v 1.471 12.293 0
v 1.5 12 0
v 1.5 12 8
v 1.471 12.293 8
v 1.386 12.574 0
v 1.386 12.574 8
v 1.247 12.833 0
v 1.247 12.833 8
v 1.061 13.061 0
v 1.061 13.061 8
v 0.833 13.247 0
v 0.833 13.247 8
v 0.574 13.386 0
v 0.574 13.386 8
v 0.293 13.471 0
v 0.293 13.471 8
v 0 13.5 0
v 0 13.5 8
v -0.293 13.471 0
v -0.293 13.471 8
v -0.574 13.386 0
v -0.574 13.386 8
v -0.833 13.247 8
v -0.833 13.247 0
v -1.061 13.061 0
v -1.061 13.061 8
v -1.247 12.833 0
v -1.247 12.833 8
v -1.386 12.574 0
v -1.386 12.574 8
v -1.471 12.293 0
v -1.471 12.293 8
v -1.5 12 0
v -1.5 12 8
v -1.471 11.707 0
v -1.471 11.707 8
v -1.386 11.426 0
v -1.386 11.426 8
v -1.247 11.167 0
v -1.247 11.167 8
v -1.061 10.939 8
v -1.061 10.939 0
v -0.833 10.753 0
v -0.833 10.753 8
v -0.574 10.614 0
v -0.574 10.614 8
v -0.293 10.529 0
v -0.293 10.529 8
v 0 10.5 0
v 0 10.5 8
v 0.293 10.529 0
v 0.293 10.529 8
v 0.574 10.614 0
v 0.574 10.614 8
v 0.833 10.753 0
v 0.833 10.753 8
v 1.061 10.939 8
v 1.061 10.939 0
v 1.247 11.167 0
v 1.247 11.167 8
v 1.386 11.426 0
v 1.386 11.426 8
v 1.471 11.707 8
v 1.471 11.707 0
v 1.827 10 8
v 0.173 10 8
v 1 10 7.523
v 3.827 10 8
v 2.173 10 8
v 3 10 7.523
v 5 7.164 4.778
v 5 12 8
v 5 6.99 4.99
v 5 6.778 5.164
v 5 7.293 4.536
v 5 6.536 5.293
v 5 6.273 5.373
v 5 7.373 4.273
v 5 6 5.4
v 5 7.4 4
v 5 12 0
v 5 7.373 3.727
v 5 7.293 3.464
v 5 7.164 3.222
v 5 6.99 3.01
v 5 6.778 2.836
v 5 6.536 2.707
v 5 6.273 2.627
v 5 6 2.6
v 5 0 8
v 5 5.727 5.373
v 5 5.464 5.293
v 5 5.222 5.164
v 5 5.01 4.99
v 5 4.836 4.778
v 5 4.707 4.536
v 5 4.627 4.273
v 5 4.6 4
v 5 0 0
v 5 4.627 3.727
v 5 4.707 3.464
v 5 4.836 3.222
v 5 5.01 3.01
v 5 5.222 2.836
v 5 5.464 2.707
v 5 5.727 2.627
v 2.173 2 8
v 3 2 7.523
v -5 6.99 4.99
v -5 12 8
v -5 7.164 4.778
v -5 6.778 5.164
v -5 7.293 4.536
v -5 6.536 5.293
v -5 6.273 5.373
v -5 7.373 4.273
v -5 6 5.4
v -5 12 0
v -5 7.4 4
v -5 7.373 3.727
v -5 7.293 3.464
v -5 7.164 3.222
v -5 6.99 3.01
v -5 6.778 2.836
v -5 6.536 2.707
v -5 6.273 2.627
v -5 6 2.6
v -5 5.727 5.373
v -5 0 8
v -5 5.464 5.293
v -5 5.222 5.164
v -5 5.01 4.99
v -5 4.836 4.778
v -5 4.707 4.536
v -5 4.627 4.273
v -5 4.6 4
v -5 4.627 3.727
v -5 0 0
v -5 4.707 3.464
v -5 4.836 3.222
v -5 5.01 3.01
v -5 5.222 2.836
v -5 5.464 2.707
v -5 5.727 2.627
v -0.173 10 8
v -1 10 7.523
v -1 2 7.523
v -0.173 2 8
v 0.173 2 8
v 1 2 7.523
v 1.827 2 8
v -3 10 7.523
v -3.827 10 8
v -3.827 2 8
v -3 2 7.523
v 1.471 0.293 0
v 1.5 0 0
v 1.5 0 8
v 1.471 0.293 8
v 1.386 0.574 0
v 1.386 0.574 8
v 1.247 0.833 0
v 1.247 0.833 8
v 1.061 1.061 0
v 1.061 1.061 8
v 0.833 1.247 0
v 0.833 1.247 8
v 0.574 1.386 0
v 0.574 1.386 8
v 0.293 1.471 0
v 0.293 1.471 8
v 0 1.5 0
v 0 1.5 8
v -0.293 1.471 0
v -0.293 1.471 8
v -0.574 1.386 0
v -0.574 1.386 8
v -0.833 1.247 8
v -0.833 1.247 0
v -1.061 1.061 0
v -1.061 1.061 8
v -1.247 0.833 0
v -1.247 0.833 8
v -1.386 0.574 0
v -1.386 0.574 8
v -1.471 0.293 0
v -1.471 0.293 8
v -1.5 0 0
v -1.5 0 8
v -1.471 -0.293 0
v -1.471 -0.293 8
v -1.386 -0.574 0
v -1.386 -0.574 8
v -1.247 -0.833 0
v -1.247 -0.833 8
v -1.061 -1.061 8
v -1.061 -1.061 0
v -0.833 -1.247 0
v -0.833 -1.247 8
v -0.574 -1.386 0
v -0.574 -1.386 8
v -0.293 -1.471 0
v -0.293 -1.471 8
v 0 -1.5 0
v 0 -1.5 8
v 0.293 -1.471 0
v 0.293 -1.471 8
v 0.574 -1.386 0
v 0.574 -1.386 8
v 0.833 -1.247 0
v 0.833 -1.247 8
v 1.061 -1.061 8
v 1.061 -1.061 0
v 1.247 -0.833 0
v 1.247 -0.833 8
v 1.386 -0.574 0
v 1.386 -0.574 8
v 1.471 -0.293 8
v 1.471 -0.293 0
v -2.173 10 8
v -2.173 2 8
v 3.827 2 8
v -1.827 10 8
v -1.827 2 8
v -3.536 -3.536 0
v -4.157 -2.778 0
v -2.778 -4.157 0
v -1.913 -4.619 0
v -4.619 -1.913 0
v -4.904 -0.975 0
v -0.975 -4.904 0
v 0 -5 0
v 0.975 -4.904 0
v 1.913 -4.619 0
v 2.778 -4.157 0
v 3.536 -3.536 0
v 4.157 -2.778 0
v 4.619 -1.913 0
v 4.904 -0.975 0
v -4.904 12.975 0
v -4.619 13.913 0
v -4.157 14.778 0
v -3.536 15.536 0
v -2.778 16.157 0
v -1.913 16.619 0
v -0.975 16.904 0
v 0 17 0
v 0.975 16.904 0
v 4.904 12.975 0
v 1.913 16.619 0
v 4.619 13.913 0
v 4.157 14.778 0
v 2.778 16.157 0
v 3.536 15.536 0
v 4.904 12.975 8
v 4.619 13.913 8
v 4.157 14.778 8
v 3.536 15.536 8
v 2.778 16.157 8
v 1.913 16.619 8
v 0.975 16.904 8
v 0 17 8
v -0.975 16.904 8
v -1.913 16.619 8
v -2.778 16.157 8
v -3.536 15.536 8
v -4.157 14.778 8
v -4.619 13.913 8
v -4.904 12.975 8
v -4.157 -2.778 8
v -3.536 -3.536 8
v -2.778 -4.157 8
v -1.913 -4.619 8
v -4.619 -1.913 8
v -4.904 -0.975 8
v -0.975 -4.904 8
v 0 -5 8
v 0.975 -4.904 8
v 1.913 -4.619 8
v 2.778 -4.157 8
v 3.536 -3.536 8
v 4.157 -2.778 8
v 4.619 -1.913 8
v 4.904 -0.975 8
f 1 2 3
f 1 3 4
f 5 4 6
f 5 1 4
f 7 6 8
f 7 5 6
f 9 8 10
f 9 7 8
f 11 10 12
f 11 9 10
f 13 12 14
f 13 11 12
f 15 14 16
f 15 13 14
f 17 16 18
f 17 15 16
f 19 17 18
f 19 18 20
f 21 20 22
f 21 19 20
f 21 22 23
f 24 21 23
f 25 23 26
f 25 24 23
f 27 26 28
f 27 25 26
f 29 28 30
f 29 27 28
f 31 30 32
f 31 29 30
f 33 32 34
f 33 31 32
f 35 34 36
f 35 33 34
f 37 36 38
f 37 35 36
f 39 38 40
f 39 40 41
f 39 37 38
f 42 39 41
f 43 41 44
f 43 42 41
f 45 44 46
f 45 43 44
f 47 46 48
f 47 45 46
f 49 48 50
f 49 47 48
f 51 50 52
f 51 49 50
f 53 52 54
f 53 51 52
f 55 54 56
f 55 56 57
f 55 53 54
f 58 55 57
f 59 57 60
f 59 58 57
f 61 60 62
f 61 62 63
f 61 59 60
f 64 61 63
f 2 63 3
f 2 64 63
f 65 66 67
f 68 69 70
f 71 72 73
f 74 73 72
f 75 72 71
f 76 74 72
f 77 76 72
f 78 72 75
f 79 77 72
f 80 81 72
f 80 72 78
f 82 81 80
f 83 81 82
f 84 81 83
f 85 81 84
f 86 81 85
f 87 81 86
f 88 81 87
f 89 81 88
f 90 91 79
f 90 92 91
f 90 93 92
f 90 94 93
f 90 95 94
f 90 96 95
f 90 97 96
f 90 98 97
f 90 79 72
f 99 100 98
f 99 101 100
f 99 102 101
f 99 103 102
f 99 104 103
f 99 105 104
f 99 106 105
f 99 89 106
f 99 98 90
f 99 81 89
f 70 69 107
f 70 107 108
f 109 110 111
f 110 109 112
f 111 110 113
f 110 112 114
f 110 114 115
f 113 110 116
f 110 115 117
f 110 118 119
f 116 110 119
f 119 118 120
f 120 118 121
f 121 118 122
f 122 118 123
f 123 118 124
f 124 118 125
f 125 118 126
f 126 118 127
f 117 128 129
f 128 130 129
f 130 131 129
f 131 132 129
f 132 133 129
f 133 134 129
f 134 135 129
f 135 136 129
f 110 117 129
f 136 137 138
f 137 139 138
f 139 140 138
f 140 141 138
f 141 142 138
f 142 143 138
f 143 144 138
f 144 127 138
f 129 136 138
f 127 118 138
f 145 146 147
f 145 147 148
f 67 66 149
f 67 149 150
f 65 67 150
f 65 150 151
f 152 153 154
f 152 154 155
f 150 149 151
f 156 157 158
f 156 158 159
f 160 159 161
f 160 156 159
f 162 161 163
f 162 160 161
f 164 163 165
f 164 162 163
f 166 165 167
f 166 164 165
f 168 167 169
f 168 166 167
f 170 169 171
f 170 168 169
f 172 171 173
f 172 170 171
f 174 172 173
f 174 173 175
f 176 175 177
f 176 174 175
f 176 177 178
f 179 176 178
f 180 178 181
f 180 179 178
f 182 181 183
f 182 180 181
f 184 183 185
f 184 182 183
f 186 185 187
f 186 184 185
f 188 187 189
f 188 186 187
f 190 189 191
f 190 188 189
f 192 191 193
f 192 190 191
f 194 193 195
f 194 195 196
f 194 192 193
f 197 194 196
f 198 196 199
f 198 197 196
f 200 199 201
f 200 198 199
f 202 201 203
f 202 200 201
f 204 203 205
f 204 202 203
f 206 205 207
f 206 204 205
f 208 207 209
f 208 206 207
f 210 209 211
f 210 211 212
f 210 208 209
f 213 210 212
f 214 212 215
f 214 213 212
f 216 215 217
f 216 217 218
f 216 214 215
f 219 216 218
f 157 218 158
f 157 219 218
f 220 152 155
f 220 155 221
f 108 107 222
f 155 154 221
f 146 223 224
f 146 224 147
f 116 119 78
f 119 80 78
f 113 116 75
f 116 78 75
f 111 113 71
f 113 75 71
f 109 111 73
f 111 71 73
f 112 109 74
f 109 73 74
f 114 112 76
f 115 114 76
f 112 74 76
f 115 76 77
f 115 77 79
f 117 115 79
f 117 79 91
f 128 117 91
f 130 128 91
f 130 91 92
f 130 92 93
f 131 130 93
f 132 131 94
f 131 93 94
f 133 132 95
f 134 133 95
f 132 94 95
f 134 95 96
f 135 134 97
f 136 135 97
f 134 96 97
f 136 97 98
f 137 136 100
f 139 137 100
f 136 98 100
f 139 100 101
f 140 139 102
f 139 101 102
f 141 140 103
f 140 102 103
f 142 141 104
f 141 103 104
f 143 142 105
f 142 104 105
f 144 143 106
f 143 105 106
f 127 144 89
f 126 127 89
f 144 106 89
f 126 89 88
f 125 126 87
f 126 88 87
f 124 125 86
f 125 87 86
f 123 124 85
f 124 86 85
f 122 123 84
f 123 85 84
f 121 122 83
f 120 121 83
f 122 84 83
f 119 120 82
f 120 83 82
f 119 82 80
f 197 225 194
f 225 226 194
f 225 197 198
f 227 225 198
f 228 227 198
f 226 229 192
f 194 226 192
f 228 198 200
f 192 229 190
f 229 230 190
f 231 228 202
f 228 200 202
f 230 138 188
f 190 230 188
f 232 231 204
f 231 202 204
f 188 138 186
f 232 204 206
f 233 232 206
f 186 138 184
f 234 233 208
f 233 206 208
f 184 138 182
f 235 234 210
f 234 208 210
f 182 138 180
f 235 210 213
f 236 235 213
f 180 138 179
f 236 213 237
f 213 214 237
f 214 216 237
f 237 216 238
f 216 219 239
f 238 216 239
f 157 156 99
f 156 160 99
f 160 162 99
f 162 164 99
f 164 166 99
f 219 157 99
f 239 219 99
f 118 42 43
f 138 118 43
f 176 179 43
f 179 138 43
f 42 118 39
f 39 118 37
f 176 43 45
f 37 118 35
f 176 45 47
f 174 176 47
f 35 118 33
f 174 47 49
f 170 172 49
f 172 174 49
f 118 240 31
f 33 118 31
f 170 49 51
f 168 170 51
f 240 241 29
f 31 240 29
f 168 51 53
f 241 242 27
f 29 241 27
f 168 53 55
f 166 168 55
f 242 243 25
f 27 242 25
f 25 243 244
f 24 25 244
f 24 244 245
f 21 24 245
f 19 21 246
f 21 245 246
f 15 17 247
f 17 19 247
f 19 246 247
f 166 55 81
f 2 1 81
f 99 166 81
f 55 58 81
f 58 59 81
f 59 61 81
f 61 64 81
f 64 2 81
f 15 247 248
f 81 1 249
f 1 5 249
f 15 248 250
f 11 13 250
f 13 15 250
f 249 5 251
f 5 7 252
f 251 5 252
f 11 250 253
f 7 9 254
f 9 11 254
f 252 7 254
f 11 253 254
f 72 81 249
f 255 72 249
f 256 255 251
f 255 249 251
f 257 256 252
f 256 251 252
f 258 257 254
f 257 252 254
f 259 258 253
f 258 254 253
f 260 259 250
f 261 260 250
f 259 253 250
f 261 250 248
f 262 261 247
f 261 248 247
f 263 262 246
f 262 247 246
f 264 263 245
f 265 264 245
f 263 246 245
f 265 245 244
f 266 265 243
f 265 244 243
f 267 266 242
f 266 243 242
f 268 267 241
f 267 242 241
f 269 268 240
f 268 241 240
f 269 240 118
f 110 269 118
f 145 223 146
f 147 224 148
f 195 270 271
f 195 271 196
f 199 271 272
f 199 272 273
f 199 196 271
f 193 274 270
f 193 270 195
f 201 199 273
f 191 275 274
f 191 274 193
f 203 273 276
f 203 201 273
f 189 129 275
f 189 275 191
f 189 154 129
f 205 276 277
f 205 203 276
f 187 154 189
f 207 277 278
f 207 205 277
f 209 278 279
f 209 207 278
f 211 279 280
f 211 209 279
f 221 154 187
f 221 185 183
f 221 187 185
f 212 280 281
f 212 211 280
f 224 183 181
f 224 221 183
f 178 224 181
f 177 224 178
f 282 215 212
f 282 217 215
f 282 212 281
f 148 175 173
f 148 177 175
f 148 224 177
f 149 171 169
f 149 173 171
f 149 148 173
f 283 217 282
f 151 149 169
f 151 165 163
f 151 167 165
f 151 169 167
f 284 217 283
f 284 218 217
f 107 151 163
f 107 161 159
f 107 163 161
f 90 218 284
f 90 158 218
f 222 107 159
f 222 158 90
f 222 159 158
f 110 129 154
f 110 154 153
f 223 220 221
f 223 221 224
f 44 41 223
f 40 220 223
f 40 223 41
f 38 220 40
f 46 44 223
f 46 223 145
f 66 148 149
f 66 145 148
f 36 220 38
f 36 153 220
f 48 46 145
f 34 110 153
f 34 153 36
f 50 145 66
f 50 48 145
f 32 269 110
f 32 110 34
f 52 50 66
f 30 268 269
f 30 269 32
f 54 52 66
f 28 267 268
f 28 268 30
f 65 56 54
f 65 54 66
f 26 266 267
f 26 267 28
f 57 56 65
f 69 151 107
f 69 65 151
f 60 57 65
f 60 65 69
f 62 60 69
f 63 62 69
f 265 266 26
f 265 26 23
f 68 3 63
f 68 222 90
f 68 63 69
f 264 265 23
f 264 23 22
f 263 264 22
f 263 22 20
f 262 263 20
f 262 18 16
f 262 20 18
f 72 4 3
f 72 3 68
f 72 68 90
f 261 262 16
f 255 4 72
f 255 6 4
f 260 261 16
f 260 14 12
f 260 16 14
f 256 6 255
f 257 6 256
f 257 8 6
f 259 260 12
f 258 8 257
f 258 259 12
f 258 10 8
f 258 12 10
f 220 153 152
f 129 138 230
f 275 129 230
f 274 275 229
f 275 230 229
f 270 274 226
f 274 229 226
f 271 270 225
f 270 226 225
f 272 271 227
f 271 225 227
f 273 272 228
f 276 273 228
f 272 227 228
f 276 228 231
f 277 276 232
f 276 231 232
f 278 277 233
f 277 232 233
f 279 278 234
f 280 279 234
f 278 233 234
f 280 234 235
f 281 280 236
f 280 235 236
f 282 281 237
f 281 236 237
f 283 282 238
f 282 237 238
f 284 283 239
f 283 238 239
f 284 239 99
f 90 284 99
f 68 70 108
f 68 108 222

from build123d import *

# Parameters (mm, degrees)
PAD002_DEPTH = 8
SKETCH001_R  = 1.4
PAD001_DEPTH = 5
SKETCH_R     = 1.5
PAD_DEPTH    = 8


with BuildPart() as pad002:
    # Sketch002 → Pad002 (new body)
    with BuildSketch(Plane(origin=(-6, 10, 4), x_dir=(1, 0, 0), z_dir=(0, -1, 0))):
        Polygon((2, 4.1), (3, 3.52265), (4, 4.1), (5, 3.52265), (6, 4.1), (7, 3.52265), (8, 4.1), (9, 3.52265), (10, 4.1), (10, 5.1), (2, 5.1), align=None)
    extrude(amount=PAD002_DEPTH)


with BuildPart() as fusion:
    # Sketch001 → Pad001 (new body, symmetric)
    with BuildSketch(Plane.YZ):
        with Locations((6, 4)):
            Circle(SKETCH001_R)
    extrude(amount=PAD001_DEPTH, both=True)

    # Fusion: union Pad002
    add(pad002.part)


with BuildPart() as cut:
    # Sketch → Pad (new body)
    with BuildSketch(Plane.XY):
        with BuildLine():
            ThreePointArc((5, 12), (0, 17), (-5, 12))
            Line((-5, 12), (-5, 0))
            ThreePointArc((-5, 0), (0, -5), (5, 0))
            Line((5, 12), (5, 0))
        make_face()
        with Locations((0, 12)):
            Circle(SKETCH_R, mode=Mode.SUBTRACT)
        Circle(SKETCH_R, mode=Mode.SUBTRACT)
    extrude(amount=PAD_DEPTH)

    # Cut: cut Fusion
    add(fusion.part, mode=Mode.SUBTRACT)


solid = cut.part
